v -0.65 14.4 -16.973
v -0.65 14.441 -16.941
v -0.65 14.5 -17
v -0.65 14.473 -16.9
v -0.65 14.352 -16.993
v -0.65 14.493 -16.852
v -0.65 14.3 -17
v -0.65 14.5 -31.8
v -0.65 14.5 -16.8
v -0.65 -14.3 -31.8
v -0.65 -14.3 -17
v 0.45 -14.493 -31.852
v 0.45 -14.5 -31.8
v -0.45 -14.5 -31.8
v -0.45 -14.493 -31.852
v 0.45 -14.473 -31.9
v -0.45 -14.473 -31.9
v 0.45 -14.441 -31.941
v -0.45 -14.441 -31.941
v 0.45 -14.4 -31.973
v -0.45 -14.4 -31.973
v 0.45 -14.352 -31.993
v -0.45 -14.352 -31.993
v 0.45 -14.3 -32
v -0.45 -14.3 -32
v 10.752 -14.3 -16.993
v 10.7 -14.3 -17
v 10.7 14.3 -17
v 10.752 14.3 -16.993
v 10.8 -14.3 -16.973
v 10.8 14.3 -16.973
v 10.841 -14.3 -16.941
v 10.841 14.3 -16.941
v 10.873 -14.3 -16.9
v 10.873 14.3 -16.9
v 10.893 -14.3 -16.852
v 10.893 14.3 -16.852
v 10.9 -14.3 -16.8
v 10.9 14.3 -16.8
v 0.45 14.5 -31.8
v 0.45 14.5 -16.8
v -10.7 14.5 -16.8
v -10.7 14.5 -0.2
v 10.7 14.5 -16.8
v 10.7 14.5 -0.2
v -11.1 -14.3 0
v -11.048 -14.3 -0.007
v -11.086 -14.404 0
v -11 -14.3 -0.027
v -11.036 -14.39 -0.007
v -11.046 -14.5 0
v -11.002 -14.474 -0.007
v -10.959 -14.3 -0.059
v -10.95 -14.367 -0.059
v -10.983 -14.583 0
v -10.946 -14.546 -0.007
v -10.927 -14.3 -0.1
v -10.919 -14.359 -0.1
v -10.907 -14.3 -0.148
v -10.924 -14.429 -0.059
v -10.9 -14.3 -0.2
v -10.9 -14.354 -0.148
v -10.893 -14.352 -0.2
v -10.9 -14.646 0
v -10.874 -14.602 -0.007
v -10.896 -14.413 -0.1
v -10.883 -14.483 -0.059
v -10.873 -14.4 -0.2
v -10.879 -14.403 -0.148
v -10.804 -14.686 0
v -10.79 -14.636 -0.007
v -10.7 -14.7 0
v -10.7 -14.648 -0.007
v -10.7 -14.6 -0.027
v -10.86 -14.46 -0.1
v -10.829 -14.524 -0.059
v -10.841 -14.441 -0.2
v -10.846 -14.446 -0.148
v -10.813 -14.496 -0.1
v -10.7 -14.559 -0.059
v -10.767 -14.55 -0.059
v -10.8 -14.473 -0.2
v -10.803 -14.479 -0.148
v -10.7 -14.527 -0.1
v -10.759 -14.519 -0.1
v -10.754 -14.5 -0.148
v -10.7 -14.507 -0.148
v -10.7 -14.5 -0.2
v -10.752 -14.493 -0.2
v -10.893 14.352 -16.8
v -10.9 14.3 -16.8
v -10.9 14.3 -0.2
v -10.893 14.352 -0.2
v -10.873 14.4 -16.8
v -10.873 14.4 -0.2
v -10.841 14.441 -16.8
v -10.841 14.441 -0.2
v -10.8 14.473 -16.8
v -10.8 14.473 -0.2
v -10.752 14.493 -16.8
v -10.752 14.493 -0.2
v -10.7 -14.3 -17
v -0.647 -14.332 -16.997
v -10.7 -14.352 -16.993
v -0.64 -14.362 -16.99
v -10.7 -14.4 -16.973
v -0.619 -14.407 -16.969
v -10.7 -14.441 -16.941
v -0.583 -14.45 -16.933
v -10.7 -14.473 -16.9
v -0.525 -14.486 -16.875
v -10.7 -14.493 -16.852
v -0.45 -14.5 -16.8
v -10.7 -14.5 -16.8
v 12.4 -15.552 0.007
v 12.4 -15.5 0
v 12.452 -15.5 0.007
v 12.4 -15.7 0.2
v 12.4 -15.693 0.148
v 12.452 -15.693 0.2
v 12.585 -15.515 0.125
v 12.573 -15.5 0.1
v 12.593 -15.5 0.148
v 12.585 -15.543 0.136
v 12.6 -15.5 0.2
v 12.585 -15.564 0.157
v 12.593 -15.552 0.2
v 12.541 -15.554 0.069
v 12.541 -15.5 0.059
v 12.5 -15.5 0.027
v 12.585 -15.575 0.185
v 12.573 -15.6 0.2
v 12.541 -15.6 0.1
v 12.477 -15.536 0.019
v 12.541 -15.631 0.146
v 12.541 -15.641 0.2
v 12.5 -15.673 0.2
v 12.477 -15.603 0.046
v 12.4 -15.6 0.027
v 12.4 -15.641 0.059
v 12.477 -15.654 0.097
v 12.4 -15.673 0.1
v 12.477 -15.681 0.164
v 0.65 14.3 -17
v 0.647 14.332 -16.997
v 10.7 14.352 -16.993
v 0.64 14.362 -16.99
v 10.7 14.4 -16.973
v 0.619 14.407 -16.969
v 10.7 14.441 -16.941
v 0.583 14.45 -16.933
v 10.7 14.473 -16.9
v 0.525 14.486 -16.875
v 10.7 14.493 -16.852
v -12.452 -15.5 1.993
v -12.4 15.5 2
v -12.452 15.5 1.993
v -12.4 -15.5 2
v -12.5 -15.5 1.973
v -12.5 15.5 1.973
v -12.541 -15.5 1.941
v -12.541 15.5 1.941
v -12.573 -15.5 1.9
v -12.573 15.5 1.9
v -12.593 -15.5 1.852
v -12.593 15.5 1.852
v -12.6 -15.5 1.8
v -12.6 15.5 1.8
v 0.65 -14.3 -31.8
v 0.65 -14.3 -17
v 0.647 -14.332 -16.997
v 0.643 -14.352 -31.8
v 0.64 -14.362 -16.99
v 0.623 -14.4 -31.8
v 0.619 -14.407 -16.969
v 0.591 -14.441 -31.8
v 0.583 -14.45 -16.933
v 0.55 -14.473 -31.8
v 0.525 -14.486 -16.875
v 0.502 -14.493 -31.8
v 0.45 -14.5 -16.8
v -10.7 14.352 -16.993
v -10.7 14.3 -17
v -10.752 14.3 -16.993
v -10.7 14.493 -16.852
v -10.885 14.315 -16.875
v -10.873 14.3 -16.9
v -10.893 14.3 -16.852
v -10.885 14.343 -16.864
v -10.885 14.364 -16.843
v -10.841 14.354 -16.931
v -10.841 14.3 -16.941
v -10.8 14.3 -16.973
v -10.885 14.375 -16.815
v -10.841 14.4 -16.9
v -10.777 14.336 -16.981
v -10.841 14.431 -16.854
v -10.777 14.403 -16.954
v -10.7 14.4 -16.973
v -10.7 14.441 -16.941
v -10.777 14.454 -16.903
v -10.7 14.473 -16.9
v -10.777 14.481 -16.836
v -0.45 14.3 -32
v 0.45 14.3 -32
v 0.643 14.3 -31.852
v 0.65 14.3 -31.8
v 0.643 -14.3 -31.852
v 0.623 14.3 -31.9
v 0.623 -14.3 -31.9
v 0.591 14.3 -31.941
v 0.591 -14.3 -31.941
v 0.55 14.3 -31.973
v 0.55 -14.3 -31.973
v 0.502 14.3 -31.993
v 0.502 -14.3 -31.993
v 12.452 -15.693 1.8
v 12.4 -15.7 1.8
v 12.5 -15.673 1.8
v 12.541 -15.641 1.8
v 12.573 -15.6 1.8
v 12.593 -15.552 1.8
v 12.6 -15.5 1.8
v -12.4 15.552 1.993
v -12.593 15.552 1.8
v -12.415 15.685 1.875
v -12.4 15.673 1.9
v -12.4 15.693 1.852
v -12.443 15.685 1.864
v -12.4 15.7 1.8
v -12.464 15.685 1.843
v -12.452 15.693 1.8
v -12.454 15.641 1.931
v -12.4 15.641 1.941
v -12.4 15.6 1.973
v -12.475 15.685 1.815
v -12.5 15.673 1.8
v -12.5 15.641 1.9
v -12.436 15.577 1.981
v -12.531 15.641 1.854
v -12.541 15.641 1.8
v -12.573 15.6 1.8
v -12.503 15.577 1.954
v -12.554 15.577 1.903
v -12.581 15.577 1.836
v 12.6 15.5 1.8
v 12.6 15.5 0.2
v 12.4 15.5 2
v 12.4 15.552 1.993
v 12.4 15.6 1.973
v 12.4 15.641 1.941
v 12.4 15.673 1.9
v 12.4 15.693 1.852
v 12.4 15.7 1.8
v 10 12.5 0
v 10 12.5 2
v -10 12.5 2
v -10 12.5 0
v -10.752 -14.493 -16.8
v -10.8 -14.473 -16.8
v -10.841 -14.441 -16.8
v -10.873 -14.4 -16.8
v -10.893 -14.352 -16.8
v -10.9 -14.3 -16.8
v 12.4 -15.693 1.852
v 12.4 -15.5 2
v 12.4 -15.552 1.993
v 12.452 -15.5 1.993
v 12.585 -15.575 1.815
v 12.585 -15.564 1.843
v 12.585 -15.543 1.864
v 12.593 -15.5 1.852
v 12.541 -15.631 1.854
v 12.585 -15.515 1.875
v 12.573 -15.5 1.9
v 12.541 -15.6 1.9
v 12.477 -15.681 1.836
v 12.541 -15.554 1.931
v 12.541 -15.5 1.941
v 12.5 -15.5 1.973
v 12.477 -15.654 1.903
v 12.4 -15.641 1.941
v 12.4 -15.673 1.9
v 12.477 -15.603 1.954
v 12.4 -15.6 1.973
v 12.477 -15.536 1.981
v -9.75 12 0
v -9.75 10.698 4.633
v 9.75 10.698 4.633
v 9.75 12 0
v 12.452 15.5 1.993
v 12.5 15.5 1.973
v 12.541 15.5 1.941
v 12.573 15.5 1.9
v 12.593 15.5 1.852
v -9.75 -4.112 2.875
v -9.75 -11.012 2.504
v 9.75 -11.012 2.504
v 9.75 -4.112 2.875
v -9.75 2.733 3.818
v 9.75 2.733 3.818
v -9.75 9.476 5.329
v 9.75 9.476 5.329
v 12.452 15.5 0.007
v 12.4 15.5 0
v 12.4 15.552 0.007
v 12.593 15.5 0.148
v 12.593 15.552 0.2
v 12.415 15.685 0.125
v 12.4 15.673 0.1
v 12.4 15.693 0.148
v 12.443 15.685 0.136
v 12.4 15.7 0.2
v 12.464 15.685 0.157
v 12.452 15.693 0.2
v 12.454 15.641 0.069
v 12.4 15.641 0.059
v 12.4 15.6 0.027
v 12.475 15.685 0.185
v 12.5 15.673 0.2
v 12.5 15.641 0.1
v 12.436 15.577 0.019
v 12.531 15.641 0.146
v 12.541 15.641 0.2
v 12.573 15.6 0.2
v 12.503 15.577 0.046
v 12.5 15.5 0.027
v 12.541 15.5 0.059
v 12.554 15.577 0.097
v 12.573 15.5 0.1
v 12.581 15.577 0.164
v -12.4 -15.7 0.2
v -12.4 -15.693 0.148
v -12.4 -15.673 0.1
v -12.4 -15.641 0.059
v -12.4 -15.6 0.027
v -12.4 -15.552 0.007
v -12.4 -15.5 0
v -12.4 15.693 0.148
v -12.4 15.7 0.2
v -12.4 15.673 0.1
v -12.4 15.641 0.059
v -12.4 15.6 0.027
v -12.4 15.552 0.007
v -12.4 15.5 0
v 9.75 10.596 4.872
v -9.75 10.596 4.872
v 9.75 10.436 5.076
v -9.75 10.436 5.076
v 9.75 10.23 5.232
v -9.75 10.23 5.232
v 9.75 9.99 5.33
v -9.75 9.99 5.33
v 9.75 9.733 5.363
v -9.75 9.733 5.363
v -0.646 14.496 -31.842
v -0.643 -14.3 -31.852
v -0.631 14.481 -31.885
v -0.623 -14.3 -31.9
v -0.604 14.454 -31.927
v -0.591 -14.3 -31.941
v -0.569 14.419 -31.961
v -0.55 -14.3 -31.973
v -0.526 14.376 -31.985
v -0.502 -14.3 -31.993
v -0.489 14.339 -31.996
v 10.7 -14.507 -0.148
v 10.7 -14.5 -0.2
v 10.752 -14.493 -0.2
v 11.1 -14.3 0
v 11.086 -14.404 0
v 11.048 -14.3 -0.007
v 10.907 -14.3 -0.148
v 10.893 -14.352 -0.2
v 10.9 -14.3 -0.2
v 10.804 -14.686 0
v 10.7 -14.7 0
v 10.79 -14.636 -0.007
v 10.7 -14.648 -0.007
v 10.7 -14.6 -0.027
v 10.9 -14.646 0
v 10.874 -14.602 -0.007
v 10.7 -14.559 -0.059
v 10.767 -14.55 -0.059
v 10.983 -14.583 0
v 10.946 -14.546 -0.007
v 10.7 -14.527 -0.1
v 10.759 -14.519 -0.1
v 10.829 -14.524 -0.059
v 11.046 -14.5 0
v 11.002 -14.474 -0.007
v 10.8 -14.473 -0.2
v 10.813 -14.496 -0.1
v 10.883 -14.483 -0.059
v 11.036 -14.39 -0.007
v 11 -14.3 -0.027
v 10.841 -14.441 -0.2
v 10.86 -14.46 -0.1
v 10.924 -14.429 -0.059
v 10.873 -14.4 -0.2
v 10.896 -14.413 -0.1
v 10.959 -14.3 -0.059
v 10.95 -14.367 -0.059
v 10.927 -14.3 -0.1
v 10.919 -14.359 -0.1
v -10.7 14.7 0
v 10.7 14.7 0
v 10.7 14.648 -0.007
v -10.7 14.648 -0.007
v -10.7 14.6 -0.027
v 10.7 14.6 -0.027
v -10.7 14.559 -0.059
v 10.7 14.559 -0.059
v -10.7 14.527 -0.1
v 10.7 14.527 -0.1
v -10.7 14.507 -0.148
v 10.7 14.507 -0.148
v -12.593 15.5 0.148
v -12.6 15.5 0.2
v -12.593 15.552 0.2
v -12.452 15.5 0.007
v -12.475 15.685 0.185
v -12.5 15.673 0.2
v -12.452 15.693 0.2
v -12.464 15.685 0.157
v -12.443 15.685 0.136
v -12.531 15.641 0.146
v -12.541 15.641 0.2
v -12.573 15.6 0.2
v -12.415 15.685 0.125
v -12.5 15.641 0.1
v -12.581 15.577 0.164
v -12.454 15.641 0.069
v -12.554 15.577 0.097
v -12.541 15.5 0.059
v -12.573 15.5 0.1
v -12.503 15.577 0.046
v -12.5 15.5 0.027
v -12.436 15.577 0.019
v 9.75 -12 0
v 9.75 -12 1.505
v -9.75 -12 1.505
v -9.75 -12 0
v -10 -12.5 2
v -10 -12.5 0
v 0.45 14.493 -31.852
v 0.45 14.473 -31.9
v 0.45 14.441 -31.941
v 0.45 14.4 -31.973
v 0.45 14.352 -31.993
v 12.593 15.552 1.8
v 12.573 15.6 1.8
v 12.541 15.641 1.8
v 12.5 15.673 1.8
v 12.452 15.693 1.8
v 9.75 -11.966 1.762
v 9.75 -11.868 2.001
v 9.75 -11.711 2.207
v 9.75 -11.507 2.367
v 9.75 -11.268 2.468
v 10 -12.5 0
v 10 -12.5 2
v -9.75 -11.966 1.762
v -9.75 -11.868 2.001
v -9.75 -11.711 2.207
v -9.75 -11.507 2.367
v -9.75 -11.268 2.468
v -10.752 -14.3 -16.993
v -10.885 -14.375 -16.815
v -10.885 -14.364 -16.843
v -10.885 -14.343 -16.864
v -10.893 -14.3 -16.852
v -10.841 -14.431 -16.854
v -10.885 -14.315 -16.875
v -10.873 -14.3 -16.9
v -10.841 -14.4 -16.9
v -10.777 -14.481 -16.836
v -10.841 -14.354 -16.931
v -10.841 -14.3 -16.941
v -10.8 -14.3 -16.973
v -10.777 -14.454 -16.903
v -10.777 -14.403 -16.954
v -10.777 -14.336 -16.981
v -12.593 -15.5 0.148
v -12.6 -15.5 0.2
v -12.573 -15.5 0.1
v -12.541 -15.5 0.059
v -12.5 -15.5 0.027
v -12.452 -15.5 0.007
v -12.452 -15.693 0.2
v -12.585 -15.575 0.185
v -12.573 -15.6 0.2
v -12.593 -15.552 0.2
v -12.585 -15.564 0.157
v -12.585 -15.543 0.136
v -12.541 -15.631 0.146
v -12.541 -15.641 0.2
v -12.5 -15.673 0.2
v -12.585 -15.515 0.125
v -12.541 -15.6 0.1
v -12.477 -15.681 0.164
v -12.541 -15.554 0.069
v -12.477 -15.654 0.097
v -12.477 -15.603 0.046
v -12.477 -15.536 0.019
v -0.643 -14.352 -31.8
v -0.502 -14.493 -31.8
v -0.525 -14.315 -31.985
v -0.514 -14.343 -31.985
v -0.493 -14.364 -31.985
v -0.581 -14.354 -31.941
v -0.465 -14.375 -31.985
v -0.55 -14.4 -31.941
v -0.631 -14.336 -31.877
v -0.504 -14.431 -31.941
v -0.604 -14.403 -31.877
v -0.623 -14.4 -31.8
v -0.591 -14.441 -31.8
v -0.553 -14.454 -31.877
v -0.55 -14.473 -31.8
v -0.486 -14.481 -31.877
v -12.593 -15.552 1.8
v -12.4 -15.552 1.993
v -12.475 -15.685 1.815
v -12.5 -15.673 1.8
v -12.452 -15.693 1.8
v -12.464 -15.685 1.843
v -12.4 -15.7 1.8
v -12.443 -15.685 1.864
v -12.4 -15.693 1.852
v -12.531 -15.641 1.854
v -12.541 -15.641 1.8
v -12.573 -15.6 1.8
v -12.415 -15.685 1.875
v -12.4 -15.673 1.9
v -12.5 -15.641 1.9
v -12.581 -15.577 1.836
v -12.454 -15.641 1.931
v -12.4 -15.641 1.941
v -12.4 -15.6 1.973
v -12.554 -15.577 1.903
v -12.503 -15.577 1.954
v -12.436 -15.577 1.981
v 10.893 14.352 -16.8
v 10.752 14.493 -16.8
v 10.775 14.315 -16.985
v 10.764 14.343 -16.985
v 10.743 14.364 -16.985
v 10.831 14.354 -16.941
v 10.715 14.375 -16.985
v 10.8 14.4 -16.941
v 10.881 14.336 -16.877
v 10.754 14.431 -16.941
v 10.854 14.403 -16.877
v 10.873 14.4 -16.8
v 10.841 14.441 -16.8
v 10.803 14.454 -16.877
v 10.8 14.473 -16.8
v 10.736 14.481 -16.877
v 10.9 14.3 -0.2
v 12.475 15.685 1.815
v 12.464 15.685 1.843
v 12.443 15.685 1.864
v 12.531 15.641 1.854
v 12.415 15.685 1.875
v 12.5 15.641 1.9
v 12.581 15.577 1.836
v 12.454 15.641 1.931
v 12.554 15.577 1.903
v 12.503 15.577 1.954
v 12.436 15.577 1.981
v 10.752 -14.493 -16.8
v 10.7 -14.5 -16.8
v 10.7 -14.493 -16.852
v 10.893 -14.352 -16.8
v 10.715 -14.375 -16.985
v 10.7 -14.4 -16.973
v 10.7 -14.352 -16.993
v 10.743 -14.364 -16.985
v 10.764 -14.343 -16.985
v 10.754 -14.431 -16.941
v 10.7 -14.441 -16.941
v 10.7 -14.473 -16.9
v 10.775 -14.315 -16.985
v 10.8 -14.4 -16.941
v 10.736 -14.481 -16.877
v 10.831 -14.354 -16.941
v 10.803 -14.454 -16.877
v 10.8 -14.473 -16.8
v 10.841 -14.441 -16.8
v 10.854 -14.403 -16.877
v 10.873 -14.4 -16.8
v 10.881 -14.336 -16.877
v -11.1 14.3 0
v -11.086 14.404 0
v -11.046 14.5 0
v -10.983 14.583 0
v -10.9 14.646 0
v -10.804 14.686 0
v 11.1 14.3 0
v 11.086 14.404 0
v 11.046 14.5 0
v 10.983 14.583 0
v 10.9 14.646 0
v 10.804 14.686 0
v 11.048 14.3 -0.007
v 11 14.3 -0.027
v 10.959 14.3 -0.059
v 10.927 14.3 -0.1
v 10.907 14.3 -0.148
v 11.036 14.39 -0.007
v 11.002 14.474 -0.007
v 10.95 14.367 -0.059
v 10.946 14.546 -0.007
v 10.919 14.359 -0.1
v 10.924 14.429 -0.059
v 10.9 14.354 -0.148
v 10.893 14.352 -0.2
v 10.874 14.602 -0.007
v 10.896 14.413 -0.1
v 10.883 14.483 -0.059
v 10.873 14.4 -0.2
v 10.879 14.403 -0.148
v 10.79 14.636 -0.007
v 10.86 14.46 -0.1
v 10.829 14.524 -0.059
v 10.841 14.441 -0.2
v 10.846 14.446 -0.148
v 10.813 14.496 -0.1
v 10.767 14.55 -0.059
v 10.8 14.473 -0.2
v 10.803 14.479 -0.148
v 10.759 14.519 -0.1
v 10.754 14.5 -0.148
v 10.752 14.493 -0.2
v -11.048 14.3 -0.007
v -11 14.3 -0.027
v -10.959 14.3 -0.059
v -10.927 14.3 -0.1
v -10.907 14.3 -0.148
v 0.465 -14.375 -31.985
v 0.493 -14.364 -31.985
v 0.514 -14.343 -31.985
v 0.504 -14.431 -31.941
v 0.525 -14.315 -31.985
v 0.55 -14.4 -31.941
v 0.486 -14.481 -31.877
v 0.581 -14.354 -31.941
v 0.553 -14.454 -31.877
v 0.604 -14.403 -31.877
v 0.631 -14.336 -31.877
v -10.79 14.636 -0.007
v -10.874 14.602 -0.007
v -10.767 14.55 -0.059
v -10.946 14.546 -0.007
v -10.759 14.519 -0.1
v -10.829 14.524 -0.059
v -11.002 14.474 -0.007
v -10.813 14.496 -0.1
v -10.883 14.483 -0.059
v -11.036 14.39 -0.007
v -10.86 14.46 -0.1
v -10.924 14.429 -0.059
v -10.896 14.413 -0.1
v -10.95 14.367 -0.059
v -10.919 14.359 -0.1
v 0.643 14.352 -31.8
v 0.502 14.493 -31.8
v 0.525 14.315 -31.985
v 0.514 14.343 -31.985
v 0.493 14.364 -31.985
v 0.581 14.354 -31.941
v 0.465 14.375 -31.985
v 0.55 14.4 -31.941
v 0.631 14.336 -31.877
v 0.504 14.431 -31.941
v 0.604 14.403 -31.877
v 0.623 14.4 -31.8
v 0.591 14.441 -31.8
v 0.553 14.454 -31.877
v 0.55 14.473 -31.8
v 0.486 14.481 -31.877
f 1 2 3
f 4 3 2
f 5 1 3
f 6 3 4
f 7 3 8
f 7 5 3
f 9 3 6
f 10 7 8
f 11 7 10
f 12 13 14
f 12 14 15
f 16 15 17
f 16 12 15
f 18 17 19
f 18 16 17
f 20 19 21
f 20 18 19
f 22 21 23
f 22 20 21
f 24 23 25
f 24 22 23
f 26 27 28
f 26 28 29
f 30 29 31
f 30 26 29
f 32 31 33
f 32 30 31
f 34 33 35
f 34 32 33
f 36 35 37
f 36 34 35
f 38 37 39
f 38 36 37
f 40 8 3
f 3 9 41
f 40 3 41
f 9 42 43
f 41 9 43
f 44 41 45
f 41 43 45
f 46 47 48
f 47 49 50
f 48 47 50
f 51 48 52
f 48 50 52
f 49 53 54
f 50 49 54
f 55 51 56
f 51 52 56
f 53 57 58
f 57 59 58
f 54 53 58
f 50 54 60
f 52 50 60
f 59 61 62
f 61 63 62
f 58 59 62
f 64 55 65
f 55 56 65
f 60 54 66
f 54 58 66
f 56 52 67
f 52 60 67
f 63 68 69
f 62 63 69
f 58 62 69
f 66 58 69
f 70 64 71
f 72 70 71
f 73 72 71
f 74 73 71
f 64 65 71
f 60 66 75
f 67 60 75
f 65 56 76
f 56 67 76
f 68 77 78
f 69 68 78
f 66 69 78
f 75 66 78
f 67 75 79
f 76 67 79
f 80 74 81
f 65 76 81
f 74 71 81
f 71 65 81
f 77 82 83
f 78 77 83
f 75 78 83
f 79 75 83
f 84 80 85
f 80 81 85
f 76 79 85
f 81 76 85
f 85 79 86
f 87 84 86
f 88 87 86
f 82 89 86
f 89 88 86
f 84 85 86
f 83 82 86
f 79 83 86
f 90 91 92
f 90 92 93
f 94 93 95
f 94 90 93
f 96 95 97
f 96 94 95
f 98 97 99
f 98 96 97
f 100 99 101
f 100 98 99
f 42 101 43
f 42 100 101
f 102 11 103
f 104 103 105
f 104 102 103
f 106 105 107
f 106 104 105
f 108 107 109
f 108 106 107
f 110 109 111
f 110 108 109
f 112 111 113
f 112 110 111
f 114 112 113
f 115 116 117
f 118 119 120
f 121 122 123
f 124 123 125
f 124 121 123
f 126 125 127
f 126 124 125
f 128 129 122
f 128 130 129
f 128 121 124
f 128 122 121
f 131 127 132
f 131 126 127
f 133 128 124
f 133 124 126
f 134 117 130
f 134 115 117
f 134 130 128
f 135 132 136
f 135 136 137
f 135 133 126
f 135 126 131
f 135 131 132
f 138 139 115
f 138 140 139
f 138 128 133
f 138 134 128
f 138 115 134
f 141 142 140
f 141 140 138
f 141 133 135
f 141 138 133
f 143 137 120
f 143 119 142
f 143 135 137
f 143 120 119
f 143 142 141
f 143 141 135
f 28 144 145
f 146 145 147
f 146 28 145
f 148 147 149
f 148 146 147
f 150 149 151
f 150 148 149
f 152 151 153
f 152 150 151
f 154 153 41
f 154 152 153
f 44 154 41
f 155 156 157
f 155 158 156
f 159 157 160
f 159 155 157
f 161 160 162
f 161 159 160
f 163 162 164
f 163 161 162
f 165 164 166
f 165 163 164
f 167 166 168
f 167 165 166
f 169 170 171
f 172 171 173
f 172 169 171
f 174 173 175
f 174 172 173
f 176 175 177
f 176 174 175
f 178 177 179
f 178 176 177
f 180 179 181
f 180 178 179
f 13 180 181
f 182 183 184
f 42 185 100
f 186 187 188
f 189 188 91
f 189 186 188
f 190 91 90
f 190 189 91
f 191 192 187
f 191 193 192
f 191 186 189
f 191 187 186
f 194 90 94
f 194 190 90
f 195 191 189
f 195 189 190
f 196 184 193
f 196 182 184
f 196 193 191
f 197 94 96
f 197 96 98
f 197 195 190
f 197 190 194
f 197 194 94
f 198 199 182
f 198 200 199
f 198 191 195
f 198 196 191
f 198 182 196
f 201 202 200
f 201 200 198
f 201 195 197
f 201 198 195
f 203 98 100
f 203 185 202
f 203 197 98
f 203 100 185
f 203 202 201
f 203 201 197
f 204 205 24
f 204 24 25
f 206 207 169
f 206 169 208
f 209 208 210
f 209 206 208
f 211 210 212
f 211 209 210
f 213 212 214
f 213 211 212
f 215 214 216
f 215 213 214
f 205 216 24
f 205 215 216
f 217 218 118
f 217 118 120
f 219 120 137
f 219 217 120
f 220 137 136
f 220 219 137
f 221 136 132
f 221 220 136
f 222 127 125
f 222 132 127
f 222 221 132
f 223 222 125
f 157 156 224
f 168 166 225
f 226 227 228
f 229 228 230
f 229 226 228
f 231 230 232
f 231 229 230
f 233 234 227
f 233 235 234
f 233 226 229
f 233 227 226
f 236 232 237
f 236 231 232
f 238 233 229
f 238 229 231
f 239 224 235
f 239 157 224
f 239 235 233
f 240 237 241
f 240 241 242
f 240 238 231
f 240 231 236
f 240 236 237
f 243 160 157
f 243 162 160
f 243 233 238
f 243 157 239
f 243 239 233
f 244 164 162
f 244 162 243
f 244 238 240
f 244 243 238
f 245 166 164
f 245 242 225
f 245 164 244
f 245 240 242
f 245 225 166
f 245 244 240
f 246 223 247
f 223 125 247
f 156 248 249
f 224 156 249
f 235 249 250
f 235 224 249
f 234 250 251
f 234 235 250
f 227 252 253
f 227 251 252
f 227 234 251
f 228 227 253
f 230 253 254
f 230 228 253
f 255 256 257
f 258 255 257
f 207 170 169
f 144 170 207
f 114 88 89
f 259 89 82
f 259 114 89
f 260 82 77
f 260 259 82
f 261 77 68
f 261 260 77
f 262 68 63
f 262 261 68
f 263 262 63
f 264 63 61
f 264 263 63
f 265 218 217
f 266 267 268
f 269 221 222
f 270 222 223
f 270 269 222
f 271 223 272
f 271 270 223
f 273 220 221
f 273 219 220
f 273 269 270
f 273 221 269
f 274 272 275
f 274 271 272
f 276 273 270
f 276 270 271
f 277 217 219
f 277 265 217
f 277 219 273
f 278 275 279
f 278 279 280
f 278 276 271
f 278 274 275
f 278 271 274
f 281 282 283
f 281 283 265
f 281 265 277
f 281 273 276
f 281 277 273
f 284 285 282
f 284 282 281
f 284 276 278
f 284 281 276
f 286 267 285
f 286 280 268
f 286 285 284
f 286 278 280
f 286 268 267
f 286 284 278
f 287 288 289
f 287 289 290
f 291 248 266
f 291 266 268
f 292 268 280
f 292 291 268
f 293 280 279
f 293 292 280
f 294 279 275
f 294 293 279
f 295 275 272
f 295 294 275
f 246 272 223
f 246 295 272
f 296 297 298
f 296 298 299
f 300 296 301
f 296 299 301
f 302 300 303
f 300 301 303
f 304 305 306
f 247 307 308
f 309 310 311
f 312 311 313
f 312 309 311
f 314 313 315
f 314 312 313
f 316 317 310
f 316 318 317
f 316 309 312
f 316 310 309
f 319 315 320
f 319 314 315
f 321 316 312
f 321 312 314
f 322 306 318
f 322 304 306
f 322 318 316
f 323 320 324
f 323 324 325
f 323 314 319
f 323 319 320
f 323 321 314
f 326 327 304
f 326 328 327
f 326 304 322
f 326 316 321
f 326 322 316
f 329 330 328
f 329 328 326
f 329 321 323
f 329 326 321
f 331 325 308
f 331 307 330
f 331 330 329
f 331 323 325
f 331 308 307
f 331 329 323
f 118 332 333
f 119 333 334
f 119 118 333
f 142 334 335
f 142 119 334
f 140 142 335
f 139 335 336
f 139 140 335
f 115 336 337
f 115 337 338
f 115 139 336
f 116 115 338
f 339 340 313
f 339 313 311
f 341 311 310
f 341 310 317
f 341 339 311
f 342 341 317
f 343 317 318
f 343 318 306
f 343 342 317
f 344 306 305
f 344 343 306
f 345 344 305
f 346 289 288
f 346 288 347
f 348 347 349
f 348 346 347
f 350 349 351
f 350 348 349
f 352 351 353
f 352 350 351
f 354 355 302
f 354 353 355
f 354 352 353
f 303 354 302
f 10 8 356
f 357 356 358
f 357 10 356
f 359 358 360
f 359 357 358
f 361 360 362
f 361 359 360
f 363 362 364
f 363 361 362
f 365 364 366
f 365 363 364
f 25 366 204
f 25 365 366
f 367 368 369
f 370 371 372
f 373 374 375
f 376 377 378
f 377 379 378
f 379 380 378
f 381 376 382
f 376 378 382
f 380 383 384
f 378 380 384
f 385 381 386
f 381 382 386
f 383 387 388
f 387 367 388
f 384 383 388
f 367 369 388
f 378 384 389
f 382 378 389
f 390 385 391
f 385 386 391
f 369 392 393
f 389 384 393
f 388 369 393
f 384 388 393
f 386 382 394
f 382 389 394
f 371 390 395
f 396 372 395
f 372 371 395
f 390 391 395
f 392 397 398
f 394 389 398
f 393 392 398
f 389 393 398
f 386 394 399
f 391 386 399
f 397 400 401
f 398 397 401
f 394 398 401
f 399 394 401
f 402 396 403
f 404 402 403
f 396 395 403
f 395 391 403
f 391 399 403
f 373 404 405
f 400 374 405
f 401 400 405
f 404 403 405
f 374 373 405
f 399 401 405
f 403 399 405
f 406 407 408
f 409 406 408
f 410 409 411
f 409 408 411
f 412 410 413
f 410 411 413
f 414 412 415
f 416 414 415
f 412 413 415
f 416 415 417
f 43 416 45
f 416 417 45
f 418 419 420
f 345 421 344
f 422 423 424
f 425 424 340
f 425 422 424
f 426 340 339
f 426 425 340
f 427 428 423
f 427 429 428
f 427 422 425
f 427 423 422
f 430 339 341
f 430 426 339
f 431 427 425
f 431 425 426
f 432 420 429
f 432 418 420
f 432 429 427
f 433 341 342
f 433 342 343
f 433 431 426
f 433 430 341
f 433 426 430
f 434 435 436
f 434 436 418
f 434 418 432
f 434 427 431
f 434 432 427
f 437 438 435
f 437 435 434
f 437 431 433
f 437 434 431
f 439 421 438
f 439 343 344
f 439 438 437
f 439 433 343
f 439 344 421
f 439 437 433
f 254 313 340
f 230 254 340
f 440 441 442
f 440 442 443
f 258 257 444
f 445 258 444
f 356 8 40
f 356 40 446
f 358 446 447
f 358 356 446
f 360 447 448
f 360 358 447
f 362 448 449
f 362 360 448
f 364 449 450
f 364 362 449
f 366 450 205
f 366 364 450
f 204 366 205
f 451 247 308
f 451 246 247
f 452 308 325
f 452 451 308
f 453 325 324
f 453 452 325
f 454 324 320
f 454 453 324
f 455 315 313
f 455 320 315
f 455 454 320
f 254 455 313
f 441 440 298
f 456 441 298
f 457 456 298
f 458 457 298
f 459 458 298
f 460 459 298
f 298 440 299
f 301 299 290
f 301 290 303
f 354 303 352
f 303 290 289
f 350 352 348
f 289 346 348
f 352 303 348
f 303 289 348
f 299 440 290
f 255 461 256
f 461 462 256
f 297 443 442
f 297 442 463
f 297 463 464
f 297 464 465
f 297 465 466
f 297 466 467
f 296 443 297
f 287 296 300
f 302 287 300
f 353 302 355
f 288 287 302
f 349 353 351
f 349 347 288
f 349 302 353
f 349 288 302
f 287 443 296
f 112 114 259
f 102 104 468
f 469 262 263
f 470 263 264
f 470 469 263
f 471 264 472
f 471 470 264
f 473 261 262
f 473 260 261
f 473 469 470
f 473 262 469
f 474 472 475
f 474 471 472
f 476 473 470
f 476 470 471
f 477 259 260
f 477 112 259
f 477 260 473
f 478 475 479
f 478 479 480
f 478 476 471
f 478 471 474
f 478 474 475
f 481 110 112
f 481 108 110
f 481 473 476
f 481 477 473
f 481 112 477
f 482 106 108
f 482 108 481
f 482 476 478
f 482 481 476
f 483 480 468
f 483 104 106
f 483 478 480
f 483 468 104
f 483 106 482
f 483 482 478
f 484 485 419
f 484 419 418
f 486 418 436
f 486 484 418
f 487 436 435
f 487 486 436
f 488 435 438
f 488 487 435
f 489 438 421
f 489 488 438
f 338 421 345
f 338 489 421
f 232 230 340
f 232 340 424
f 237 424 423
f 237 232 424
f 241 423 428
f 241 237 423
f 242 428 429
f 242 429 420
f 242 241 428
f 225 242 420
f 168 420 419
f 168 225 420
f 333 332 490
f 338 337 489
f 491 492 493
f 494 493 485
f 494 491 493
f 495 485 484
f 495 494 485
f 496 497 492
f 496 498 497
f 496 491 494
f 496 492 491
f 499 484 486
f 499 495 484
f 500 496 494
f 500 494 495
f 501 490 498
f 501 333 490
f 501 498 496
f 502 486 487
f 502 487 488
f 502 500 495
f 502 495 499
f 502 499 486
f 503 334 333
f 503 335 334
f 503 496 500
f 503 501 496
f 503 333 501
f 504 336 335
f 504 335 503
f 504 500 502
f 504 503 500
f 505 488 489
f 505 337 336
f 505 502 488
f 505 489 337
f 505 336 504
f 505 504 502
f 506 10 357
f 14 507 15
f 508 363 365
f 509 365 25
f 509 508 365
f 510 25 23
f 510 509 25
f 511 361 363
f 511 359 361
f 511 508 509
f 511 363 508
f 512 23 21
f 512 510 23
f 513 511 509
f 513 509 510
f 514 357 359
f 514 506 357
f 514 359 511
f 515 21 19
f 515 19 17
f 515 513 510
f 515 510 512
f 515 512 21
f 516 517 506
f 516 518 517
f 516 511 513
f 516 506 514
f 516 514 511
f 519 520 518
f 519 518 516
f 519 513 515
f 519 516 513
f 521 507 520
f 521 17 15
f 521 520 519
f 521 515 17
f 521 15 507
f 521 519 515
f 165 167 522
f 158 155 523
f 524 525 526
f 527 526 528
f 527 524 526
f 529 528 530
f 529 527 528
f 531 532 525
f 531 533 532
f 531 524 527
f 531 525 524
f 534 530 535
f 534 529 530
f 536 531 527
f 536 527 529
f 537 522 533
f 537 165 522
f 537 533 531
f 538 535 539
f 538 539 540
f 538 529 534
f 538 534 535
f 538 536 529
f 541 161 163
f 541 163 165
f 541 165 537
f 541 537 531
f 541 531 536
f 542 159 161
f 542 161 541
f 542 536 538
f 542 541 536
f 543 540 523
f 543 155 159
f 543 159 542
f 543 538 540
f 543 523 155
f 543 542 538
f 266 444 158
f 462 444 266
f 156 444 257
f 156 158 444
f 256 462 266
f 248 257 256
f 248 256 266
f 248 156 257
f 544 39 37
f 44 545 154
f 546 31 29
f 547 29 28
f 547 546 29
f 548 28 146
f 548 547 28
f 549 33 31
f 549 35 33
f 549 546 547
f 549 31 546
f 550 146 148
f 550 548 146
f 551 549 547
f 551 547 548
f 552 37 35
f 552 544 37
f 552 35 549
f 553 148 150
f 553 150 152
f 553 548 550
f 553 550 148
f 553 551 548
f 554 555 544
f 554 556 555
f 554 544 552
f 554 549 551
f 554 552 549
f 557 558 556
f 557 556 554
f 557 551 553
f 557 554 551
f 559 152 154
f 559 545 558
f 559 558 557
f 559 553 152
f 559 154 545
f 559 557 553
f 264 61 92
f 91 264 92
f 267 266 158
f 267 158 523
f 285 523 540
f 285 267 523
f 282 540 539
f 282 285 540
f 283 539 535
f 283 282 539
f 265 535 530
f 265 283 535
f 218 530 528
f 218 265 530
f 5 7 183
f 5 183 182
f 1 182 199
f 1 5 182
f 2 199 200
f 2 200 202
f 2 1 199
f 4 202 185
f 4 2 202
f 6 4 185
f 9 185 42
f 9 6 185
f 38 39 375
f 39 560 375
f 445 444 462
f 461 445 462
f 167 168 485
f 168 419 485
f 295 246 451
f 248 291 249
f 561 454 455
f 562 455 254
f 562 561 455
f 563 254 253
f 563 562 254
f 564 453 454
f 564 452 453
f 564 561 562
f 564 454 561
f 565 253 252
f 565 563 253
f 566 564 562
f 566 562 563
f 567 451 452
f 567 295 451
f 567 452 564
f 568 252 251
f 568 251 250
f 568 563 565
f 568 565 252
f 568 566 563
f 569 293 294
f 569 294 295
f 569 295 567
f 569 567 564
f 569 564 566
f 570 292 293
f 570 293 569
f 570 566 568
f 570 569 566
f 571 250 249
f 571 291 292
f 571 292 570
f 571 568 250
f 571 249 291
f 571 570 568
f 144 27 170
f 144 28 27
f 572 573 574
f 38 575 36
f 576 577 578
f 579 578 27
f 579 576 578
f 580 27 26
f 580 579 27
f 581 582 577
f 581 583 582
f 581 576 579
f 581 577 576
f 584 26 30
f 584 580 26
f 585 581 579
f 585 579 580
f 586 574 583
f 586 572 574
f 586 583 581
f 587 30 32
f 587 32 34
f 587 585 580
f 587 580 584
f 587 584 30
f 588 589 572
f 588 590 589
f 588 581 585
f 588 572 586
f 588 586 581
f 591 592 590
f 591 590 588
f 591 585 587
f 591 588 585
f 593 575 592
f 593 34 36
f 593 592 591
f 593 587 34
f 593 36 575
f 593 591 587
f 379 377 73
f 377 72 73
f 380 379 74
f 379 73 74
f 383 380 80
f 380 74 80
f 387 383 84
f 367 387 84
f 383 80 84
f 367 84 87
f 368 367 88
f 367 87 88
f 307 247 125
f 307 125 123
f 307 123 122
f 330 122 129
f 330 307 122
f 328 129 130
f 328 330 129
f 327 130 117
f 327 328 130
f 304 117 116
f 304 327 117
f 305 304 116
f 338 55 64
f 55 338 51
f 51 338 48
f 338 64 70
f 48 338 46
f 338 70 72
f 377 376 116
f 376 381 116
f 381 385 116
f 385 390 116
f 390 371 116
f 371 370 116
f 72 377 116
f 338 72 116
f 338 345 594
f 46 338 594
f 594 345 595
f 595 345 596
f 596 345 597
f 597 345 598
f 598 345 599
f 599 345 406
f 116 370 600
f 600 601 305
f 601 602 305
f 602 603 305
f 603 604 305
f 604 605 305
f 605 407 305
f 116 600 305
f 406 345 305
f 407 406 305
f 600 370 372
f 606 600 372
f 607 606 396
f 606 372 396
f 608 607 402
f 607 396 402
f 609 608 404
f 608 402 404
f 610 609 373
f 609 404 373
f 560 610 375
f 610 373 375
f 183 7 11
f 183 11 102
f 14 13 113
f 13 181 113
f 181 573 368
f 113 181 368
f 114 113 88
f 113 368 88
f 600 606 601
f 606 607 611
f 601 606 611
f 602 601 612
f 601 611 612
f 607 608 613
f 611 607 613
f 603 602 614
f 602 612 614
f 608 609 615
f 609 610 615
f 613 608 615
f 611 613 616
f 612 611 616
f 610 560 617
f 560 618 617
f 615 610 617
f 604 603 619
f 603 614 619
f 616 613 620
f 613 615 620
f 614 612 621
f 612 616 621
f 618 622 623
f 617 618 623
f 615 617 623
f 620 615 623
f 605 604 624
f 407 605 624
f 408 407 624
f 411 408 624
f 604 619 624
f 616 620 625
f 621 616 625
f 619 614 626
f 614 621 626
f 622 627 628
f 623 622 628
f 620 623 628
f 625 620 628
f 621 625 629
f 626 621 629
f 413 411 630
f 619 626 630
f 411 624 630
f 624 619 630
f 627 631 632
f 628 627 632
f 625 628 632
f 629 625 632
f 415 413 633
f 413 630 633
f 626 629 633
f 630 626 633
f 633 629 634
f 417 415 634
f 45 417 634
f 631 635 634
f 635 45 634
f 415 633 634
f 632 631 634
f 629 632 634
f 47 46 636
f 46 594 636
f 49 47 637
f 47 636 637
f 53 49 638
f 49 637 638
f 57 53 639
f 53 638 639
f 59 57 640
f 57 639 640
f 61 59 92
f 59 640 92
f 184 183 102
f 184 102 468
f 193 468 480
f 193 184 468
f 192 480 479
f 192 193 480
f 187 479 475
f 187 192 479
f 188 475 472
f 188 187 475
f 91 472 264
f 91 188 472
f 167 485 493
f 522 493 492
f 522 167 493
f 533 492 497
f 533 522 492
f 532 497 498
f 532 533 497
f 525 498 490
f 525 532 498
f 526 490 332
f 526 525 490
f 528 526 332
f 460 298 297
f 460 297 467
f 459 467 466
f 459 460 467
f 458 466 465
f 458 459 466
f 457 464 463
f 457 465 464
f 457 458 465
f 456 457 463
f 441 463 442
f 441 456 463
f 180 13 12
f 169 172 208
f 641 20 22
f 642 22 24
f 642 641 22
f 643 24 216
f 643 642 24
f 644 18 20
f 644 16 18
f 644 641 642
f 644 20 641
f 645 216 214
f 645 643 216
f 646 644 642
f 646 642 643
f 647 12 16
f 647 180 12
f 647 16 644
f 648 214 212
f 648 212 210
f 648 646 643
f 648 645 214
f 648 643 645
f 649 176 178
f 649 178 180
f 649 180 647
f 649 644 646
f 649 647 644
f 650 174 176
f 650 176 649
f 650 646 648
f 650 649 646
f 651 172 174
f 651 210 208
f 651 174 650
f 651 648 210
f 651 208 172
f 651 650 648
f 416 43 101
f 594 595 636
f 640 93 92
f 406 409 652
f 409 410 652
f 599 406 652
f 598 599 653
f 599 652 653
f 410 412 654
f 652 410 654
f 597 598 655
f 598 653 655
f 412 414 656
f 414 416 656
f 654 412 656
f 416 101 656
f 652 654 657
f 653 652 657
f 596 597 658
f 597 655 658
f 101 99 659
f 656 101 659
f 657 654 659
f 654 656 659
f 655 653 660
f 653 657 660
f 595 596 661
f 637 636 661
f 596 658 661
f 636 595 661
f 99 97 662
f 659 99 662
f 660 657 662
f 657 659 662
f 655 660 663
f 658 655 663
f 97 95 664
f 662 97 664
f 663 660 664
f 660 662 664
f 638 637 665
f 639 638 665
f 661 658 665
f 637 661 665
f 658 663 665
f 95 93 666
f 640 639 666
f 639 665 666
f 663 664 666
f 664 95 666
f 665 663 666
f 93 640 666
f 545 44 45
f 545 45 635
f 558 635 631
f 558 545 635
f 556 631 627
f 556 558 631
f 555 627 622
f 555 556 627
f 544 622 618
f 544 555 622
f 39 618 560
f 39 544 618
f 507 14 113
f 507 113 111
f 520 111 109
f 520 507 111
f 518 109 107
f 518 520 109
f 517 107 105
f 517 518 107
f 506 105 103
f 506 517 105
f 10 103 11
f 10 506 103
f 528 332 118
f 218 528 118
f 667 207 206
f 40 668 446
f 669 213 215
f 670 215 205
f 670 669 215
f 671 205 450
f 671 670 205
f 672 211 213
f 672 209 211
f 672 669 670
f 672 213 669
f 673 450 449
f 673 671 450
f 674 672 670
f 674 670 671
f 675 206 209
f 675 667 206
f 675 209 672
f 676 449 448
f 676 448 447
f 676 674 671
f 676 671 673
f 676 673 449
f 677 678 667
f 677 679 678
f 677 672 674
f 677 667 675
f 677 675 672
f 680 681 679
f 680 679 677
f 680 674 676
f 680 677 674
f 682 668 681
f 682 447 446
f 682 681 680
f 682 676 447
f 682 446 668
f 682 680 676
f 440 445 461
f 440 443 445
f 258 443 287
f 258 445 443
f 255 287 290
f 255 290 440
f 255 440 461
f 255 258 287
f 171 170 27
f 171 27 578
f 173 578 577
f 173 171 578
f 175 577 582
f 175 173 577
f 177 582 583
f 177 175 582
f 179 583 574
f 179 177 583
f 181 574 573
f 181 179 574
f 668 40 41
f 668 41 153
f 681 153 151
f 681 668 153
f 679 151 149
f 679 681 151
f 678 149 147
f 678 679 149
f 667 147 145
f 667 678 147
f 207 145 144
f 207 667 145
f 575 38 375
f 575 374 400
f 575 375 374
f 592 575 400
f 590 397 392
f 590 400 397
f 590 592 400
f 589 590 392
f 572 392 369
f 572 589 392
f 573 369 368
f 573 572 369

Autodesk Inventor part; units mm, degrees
ref_plane "YZ Plane" through (0, 0, 0) normal (1, 0, 0) x (0, 1, 0)
ref_plane "XZ Plane" through (0, 0, 0) normal (0, 1, 0) x (-1, 0, 0)
sketch "Sketch1" plane through (0, 0, 0) normal (0, 0, 1) x (1, 0, 0)
  point P0 (0, 0)
sketch "Sketch2" plane through (0, 0, 0) normal (0, 0, 1) x (1, 0, 0)
  line L0 (-12.6, -15.7) -> (12.6, -15.7)
  line L1 (12.6, -15.7) -> (12.6, 15.7)
  line L2 (12.6, 15.7) -> (-12.6, 15.7)
  line L3 (-12.6, 15.7) -> (-12.6, -15.7)
  line L4 (-12.6, -15.7) -> (12.6, 15.7) construction
  line L5 (12.6, -15.7) -> (-12.6, 15.7) construction
  point P0 (0, 0)
  dimension "d0" = 25.2
  dimension "d1" = 31.4
extrude "Extrusion1" add sketch "Sketch2" along normal blind 2
sketch "Sketch3" plane through (0, 0, 0) normal (0, 0, -1) x (-1, 0, 0)
  line L0 (-10.9, -14.5) -> (10.9, -14.5)
  line L1 (10.9, -14.5) -> (10.9, 14.5)
  line L2 (10.9, 14.5) -> (-10.9, 14.5)
  line L3 (-10.9, 14.5) -> (-10.9, -14.5)
  line L4 (-10.9, -14.5) -> (10.9, 14.5) construction
  line L5 (10.9, -14.5) -> (-10.9, 14.5) construction
  point P0 (0, 0)
  dimension "d4" = 21.8
  dimension "d5" = 29
extrude "Extrusion2" add sketch "Sketch3" along normal blind 17
sketch "Sketch4" plane through (0, 0, -17) normal (0, 0, -1) x (-1, 0, 0)
  line L0 (-0.65, 14.5) -> (0.65, 14.5)
  line L1 (0.65, 14.5) -> (0.65, -14.5)
  line L2 (0.65, -14.5) -> (-0.65, -14.5)
  line L3 (-0.65, -14.5) -> (-0.65, 14.5)
  line L4 (-0.65, 14.5) -> (0.65, -14.5) construction
  line L5 (0.65, 14.5) -> (-0.65, -14.5) construction
  line L6 (-10.9, -14.5) -> (10.9, -14.5) projected
  point P0 (0, 0)
  point P1 (0, -14.5)
  dimension "d8" = 1.3
extrude "Extrusion3" add sketch "Sketch4" along normal blind 15
sketch "Sketch5" plane through (0, 0, 2) normal (0, 0, 1) x (1, 0, 0)
  line L0 (-10, -12.5) -> (10, -12.5)
  line L1 (10, -12.5) -> (10, 12.5)
  line L2 (10, 12.5) -> (-10, 12.5)
  line L3 (-10, 12.5) -> (-10, -12.5)
  line L4 (-10, -12.5) -> (10, 12.5) construction
  line L5 (10, -12.5) -> (-10, 12.5) construction
  point P0 (0, 0)
  dimension "d11" = 20
  dimension "d12" = 25
extrude "Extrusion4" cut sketch "Sketch5" against normal blind 2
ref_plane "Work Plane1" through (0, -12.5, 2) normal (-1, 0, 0) x (0, 0, 1)
sketch "Sketch6" plane through (0, -12.5, 2) normal (-1, 0, 0) x (0, 0, 1)
  arc A0 (3.3287, 21.9761) -> (0.5045, 1.4881) centre (83.3994, 0.5) ccw
  line L0 (2.6334, 23.1979) -> (-2, 24.5)
  line L1 (-0.4954, 0.5) -> (-2, 0.5)
  line L2 (-2, 0) -> (-2, 25) projected
  arc A1 (3.3287, 21.9761) -> (2.6334, 23.1979) centre (2.3628, 22.2352) ccw
  arc A2 (-0.4954, 0.5) -> (0.5045, 1.4881) centre (-0.4954, 1.5) ccw
  line L3 (-2, 0.5) -> (-2, 24.5)
  point P0 (-2, 12.5)
  point P1 (3.5903, 22.9289)
  point P2 (0.4986, 0.5)
  dimension "d15" = 0.5
  dimension "d16" = 0.5
  dimension "d17" = 2.4986
  dimension "d18" = 5.5903
  dimension "d19" = 1
extrude "Extrusion5" add sketch "Sketch6" along normal mid plane 19.5
fillet "Fillet1" radius 0.2 33 edges at (-12.6, 0, 2) (0, -15.7, 2) (0, -15.7, 0) (-12.6, -15.7, 1) (-12.6, 0, 0) (12.6, 0, 2) (12.6, 0, 0) (0, 15.7, 2) (0, 15.7, 0) (-12.6, 15.7, 1) (12.6, -15.7, 1) (12.6, 15.7, 1) (10.9, -14.5, -8.5) (10.9, 14.5, -8.5) (0.65, 14.5, -24.5) (5.775, -14.5, -17) (0.65, -14.5, -24.5) (-0.65, -14.5, -24.5) (-5.775, -14.5, -17) (-10.9, -14.5, -8.5) (10.9, 0, -17) (5.775, 14.5, -17) (-5.775, 14.5, -17) (-0.65, 0, -32) (0.65, 0, -32) (0, 14.5, -32) (0, -14.5, -32) (-10.9, 0, -17) (-10.9, 14.5, -8.5) (-10.9, 0, 0) (0, -14.5, 0) (10.9, 0, 0) (0, 14.5, 0)
properties part number "On_Off_Switch"
